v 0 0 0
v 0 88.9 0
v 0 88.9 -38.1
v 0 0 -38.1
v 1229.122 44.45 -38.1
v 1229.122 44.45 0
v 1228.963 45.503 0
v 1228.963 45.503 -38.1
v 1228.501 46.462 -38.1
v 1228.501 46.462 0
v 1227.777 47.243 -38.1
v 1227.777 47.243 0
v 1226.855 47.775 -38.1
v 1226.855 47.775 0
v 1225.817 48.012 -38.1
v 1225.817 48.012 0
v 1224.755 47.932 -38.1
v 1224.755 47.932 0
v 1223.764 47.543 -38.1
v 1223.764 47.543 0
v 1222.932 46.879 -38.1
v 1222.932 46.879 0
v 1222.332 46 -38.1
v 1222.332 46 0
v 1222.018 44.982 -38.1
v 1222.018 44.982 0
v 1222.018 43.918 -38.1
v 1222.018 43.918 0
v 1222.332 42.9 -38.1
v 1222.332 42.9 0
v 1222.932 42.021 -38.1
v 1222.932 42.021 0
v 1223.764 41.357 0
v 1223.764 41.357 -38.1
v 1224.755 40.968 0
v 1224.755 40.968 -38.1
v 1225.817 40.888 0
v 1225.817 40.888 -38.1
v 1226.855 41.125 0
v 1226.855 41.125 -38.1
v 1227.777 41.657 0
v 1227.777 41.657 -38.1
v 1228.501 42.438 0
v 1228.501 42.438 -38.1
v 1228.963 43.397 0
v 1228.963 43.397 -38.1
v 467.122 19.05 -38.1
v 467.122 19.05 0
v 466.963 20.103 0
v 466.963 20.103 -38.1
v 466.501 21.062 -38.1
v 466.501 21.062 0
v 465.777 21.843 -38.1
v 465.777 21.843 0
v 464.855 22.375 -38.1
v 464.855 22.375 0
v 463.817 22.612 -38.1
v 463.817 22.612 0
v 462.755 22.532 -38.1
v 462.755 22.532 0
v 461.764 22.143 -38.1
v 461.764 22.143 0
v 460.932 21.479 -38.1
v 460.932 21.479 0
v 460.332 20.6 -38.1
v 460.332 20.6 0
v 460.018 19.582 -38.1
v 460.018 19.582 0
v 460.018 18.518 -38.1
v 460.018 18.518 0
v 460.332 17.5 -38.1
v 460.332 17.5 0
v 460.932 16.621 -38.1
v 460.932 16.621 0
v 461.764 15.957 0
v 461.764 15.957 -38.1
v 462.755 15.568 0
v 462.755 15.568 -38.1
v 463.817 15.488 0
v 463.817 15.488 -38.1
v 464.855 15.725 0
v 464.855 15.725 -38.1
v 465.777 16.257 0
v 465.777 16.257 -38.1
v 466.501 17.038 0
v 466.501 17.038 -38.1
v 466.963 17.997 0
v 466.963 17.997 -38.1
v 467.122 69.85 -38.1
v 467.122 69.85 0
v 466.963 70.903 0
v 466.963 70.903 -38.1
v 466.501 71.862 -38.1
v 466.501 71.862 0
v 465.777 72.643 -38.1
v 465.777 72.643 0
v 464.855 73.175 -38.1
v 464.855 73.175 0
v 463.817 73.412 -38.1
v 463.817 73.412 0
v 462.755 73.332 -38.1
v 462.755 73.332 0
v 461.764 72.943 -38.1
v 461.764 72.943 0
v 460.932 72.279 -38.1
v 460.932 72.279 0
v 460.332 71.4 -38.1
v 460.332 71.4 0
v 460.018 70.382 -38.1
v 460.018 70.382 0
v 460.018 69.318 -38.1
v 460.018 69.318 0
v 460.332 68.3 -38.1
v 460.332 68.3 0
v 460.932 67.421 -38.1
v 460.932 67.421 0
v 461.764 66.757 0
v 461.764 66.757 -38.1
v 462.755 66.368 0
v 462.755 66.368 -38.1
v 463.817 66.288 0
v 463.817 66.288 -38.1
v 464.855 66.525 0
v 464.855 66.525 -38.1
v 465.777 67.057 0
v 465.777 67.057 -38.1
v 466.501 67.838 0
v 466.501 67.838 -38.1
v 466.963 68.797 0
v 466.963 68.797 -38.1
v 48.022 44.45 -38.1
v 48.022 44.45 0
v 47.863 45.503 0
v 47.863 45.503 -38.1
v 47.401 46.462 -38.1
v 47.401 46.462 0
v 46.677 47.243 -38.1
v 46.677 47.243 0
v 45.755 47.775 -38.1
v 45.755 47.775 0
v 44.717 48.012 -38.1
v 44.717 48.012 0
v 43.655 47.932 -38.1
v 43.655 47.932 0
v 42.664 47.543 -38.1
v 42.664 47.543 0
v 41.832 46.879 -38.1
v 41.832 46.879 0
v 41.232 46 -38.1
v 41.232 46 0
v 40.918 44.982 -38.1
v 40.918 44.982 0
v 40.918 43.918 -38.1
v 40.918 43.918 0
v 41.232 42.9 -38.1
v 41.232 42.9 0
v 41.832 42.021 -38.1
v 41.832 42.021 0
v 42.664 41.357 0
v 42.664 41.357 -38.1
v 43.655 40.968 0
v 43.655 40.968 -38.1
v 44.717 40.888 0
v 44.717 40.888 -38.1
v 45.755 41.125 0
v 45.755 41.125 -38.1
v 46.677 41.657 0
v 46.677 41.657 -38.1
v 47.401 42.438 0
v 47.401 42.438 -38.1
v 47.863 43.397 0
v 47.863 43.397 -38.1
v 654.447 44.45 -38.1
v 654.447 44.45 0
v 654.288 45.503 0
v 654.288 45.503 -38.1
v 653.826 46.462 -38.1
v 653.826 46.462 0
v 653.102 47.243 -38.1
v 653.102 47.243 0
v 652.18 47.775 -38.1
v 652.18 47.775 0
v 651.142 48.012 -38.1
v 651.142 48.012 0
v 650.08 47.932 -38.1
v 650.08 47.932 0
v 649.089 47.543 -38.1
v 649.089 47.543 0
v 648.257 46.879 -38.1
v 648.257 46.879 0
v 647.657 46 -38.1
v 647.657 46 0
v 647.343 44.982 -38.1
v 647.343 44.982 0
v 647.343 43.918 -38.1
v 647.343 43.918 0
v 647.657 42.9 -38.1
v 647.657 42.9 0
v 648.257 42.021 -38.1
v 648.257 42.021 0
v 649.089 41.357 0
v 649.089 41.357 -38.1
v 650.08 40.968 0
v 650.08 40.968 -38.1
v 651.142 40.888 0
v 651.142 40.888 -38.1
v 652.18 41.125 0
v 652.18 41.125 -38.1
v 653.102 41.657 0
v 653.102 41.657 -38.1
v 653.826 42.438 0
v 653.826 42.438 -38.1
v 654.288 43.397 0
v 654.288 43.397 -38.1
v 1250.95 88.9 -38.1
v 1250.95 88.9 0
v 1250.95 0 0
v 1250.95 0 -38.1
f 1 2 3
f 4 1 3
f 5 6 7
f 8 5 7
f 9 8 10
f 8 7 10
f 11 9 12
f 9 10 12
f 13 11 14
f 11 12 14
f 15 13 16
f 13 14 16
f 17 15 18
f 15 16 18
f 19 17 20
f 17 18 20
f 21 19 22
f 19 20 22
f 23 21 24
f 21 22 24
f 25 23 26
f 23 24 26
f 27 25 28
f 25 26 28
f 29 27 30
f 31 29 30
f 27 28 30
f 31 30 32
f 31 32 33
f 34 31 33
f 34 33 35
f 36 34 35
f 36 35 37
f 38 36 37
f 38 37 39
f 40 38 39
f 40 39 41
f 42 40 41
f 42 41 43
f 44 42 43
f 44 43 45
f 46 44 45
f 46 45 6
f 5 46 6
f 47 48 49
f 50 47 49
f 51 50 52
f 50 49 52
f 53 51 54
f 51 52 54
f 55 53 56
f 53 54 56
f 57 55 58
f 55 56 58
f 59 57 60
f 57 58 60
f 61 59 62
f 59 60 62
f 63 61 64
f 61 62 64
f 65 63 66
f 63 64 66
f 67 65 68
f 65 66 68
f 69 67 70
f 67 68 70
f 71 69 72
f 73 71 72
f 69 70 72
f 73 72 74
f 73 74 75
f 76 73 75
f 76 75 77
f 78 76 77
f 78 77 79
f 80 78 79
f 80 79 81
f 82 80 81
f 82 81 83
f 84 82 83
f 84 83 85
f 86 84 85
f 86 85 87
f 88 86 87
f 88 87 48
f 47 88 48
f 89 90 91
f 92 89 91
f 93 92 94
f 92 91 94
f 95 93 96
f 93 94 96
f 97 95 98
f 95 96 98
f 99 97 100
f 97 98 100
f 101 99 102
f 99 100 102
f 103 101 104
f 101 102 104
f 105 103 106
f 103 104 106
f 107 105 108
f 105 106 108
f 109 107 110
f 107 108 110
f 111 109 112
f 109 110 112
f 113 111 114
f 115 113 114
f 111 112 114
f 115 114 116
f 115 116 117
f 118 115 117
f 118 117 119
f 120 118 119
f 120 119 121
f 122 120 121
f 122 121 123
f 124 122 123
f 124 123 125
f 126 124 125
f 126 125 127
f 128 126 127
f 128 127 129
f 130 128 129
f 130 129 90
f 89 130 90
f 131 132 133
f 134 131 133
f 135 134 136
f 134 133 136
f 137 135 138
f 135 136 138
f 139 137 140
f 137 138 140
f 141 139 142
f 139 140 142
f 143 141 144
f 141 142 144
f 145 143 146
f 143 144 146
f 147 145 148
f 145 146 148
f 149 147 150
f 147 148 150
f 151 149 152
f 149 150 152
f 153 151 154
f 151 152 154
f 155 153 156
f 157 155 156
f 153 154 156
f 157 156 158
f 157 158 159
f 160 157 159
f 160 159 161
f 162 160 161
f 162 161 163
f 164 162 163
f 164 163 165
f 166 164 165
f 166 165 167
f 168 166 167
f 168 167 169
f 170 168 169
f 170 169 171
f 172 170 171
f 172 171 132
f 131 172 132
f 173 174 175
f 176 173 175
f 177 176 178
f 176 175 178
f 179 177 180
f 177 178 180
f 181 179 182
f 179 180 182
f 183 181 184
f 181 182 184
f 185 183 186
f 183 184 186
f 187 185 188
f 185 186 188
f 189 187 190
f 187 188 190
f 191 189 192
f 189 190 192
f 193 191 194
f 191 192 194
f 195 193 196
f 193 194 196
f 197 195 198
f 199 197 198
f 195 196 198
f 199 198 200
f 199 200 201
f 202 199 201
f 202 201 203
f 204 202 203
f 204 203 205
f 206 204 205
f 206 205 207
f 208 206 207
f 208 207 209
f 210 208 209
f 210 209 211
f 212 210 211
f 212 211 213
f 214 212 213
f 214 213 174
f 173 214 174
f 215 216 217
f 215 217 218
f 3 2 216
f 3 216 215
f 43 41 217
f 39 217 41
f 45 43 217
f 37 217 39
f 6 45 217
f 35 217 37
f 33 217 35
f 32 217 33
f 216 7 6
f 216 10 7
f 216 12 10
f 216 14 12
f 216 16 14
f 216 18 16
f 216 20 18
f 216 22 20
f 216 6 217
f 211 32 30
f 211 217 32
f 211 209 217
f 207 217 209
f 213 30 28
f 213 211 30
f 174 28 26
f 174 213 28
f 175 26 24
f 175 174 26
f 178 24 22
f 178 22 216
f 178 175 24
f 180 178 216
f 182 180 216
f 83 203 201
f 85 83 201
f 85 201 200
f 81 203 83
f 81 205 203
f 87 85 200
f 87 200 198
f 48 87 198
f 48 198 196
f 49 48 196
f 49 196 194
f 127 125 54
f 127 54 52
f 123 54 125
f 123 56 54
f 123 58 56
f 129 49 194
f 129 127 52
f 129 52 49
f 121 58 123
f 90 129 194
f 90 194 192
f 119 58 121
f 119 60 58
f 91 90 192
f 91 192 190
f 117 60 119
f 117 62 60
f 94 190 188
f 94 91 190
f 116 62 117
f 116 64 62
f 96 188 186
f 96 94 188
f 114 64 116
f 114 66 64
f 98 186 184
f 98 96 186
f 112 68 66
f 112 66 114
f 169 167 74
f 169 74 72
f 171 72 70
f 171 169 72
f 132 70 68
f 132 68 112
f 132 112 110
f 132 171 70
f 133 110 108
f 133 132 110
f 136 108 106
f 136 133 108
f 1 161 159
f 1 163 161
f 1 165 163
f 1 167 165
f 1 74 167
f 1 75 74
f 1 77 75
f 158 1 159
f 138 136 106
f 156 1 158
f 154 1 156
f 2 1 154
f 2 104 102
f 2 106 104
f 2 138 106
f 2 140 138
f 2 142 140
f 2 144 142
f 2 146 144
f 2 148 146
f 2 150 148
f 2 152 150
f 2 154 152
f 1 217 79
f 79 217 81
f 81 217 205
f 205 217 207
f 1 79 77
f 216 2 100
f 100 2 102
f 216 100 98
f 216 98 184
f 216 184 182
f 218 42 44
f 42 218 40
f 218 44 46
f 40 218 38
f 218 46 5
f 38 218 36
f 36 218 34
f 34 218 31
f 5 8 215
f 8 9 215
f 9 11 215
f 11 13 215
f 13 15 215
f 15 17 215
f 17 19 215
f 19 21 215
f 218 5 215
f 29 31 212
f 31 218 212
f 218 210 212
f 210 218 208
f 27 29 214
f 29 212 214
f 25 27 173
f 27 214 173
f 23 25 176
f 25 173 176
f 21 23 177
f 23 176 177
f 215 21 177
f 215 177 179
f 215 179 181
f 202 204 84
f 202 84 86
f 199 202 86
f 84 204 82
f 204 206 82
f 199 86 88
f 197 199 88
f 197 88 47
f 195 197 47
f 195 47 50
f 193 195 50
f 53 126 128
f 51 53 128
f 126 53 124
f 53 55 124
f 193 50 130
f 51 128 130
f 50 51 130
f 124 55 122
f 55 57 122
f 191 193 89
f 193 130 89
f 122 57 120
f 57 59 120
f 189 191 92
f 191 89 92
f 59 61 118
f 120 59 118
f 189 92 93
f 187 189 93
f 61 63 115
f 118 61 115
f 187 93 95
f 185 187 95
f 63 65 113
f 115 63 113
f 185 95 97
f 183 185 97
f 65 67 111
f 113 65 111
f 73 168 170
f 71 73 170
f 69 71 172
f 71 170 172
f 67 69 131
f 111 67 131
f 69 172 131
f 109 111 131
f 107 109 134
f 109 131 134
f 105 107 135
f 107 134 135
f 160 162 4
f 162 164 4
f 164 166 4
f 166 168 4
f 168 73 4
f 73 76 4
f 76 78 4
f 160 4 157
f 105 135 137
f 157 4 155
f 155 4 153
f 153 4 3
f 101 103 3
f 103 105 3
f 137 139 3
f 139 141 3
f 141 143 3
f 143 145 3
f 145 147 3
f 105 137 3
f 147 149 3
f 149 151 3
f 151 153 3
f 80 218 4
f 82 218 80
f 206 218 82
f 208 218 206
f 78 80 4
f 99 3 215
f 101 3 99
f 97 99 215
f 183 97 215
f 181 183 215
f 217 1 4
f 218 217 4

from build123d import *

# Parameters (mm, degrees)
SKETCH1_W           = 38.1
SKETCH1_H           = 88.9
BOSS_EXTRUDE1_DEPTH = 1250.95
SKETCH2_R           = 3.571875
CUT_EXTRUDE1_DEPTH  = 1255.683514875


with BuildPart() as part:
    # Sketch1 → Boss-Extrude1 (new body)
    with BuildSketch(Plane(origin=(0, 0, 0), x_dir=(0, 0, -1), z_dir=(1, 0, 0))):
        with Locations((19.05, 44.45)):
            Rectangle(SKETCH1_W, SKETCH1_H)
    extrude(amount=BOSS_EXTRUDE1_DEPTH)

    # Sketch2 → Cut-Extrude1 (cut, through all)
    with BuildSketch(Plane.XY):
        with Locations((44.45, 44.45)):
            Circle(SKETCH2_R)
        with Locations((1225.55, 44.45)):
            Circle(SKETCH2_R)
        with Locations((650.875, 44.45)):
            Circle(SKETCH2_R)
        with Locations((463.55, 19.05)):
            Circle(SKETCH2_R)
        with Locations((463.55, 69.85)):
            Circle(SKETCH2_R)
    extrude(amount=-CUT_EXTRUDE1_DEPTH, mode=Mode.SUBTRACT)


solid = part.part
